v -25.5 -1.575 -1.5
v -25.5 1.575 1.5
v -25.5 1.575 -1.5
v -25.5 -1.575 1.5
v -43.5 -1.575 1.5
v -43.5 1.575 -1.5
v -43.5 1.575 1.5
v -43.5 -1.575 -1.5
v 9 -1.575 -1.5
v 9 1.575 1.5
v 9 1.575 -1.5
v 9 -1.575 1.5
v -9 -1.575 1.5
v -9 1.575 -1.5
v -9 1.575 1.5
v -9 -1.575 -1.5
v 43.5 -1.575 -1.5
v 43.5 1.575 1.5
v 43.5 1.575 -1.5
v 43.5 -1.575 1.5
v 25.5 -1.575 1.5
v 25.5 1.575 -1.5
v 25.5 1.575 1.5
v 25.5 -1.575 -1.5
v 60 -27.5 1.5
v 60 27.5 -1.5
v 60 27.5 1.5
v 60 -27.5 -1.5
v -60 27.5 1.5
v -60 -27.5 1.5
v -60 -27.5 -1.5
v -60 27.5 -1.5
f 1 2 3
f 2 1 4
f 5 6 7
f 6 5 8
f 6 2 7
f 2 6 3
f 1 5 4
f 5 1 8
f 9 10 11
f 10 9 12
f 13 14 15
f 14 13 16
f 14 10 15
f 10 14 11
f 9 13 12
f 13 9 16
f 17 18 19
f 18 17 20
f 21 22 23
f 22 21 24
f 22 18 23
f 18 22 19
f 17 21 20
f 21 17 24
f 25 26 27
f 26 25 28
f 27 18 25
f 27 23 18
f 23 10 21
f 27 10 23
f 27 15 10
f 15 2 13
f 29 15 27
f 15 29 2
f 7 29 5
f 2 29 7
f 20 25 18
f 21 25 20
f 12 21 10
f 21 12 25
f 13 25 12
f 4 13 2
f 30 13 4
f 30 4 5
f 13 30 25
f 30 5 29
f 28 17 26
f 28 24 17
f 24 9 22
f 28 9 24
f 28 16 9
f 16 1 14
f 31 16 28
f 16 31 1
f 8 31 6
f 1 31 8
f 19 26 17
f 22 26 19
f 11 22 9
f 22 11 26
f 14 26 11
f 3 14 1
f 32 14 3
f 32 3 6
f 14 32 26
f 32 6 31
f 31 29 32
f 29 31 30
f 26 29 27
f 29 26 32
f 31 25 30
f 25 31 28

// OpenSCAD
// ==========================================
// Laser-cut plywood tab-slot panel design
// Outer Dimensions: 120 x 55 mm, Thickness: 3.0 mm
// Features: 3 centered horizontal through-slots (18 x 3.15 mm)
// ==========================================

// --- Parameters ---
panel_length = 120.0;     // mm (X-axis)
panel_width = 55.0;       // mm (Y-axis)
panel_thickness = 3.0;    // mm (Z-axis)

slot_count = 3;
slot_length = 18.0;       // mm (X-axis)
slot_width = 3.15;        // mm (Y-axis)
laser_kerf = 0.2;         // mm

// --- Spacing Calculations ---
// Distribute slots evenly along the X-axis to maximize and balance the web/margin material.
// Total spacing remaining along X = panel_length - (slot_count * slot_length)
// There are (slot_count + 1) spaces: 2 outer margins + 2 webs between slots = 4 spaces.
total_spacing = panel_length - (slot_count * slot_length);
spacing_step = total_spacing / (slot_count + 1); // 16.5 mm

// --- Manifest Echo ---
echo(str("MAKERBENCH-LASER2D: {",
    "\"material_thickness_mm\": ", panel_thickness, ", ",
    "\"kerf_mm\": ", laser_kerf, ", ",
    "\"slot_count\": ", slot_count, ", ",
    "\"slot_length_mm\": ", slot_length, ", ",
    "\"slot_width_mm\": ", slot_width, ", ",
    "\"min_web_mm\": ", spacing_step,
"}"));

// --- Model Geometry ---
difference() {
    // Solid panel base
    cube([panel_length, panel_width, panel_thickness], center = true);
    
    // Centered horizontal row of slots
    for (i = [0 : slot_count - 1]) {
        // Compute the X center for each slot from left to right
        x_pos = -panel_length/2 + spacing_step + slot_length/2 + i * (slot_length + spacing_step);
        
        translate([x_pos, 0, 0])
            cube([slot_length, slot_width, panel_thickness + 2.0], center = true);
    }
}
